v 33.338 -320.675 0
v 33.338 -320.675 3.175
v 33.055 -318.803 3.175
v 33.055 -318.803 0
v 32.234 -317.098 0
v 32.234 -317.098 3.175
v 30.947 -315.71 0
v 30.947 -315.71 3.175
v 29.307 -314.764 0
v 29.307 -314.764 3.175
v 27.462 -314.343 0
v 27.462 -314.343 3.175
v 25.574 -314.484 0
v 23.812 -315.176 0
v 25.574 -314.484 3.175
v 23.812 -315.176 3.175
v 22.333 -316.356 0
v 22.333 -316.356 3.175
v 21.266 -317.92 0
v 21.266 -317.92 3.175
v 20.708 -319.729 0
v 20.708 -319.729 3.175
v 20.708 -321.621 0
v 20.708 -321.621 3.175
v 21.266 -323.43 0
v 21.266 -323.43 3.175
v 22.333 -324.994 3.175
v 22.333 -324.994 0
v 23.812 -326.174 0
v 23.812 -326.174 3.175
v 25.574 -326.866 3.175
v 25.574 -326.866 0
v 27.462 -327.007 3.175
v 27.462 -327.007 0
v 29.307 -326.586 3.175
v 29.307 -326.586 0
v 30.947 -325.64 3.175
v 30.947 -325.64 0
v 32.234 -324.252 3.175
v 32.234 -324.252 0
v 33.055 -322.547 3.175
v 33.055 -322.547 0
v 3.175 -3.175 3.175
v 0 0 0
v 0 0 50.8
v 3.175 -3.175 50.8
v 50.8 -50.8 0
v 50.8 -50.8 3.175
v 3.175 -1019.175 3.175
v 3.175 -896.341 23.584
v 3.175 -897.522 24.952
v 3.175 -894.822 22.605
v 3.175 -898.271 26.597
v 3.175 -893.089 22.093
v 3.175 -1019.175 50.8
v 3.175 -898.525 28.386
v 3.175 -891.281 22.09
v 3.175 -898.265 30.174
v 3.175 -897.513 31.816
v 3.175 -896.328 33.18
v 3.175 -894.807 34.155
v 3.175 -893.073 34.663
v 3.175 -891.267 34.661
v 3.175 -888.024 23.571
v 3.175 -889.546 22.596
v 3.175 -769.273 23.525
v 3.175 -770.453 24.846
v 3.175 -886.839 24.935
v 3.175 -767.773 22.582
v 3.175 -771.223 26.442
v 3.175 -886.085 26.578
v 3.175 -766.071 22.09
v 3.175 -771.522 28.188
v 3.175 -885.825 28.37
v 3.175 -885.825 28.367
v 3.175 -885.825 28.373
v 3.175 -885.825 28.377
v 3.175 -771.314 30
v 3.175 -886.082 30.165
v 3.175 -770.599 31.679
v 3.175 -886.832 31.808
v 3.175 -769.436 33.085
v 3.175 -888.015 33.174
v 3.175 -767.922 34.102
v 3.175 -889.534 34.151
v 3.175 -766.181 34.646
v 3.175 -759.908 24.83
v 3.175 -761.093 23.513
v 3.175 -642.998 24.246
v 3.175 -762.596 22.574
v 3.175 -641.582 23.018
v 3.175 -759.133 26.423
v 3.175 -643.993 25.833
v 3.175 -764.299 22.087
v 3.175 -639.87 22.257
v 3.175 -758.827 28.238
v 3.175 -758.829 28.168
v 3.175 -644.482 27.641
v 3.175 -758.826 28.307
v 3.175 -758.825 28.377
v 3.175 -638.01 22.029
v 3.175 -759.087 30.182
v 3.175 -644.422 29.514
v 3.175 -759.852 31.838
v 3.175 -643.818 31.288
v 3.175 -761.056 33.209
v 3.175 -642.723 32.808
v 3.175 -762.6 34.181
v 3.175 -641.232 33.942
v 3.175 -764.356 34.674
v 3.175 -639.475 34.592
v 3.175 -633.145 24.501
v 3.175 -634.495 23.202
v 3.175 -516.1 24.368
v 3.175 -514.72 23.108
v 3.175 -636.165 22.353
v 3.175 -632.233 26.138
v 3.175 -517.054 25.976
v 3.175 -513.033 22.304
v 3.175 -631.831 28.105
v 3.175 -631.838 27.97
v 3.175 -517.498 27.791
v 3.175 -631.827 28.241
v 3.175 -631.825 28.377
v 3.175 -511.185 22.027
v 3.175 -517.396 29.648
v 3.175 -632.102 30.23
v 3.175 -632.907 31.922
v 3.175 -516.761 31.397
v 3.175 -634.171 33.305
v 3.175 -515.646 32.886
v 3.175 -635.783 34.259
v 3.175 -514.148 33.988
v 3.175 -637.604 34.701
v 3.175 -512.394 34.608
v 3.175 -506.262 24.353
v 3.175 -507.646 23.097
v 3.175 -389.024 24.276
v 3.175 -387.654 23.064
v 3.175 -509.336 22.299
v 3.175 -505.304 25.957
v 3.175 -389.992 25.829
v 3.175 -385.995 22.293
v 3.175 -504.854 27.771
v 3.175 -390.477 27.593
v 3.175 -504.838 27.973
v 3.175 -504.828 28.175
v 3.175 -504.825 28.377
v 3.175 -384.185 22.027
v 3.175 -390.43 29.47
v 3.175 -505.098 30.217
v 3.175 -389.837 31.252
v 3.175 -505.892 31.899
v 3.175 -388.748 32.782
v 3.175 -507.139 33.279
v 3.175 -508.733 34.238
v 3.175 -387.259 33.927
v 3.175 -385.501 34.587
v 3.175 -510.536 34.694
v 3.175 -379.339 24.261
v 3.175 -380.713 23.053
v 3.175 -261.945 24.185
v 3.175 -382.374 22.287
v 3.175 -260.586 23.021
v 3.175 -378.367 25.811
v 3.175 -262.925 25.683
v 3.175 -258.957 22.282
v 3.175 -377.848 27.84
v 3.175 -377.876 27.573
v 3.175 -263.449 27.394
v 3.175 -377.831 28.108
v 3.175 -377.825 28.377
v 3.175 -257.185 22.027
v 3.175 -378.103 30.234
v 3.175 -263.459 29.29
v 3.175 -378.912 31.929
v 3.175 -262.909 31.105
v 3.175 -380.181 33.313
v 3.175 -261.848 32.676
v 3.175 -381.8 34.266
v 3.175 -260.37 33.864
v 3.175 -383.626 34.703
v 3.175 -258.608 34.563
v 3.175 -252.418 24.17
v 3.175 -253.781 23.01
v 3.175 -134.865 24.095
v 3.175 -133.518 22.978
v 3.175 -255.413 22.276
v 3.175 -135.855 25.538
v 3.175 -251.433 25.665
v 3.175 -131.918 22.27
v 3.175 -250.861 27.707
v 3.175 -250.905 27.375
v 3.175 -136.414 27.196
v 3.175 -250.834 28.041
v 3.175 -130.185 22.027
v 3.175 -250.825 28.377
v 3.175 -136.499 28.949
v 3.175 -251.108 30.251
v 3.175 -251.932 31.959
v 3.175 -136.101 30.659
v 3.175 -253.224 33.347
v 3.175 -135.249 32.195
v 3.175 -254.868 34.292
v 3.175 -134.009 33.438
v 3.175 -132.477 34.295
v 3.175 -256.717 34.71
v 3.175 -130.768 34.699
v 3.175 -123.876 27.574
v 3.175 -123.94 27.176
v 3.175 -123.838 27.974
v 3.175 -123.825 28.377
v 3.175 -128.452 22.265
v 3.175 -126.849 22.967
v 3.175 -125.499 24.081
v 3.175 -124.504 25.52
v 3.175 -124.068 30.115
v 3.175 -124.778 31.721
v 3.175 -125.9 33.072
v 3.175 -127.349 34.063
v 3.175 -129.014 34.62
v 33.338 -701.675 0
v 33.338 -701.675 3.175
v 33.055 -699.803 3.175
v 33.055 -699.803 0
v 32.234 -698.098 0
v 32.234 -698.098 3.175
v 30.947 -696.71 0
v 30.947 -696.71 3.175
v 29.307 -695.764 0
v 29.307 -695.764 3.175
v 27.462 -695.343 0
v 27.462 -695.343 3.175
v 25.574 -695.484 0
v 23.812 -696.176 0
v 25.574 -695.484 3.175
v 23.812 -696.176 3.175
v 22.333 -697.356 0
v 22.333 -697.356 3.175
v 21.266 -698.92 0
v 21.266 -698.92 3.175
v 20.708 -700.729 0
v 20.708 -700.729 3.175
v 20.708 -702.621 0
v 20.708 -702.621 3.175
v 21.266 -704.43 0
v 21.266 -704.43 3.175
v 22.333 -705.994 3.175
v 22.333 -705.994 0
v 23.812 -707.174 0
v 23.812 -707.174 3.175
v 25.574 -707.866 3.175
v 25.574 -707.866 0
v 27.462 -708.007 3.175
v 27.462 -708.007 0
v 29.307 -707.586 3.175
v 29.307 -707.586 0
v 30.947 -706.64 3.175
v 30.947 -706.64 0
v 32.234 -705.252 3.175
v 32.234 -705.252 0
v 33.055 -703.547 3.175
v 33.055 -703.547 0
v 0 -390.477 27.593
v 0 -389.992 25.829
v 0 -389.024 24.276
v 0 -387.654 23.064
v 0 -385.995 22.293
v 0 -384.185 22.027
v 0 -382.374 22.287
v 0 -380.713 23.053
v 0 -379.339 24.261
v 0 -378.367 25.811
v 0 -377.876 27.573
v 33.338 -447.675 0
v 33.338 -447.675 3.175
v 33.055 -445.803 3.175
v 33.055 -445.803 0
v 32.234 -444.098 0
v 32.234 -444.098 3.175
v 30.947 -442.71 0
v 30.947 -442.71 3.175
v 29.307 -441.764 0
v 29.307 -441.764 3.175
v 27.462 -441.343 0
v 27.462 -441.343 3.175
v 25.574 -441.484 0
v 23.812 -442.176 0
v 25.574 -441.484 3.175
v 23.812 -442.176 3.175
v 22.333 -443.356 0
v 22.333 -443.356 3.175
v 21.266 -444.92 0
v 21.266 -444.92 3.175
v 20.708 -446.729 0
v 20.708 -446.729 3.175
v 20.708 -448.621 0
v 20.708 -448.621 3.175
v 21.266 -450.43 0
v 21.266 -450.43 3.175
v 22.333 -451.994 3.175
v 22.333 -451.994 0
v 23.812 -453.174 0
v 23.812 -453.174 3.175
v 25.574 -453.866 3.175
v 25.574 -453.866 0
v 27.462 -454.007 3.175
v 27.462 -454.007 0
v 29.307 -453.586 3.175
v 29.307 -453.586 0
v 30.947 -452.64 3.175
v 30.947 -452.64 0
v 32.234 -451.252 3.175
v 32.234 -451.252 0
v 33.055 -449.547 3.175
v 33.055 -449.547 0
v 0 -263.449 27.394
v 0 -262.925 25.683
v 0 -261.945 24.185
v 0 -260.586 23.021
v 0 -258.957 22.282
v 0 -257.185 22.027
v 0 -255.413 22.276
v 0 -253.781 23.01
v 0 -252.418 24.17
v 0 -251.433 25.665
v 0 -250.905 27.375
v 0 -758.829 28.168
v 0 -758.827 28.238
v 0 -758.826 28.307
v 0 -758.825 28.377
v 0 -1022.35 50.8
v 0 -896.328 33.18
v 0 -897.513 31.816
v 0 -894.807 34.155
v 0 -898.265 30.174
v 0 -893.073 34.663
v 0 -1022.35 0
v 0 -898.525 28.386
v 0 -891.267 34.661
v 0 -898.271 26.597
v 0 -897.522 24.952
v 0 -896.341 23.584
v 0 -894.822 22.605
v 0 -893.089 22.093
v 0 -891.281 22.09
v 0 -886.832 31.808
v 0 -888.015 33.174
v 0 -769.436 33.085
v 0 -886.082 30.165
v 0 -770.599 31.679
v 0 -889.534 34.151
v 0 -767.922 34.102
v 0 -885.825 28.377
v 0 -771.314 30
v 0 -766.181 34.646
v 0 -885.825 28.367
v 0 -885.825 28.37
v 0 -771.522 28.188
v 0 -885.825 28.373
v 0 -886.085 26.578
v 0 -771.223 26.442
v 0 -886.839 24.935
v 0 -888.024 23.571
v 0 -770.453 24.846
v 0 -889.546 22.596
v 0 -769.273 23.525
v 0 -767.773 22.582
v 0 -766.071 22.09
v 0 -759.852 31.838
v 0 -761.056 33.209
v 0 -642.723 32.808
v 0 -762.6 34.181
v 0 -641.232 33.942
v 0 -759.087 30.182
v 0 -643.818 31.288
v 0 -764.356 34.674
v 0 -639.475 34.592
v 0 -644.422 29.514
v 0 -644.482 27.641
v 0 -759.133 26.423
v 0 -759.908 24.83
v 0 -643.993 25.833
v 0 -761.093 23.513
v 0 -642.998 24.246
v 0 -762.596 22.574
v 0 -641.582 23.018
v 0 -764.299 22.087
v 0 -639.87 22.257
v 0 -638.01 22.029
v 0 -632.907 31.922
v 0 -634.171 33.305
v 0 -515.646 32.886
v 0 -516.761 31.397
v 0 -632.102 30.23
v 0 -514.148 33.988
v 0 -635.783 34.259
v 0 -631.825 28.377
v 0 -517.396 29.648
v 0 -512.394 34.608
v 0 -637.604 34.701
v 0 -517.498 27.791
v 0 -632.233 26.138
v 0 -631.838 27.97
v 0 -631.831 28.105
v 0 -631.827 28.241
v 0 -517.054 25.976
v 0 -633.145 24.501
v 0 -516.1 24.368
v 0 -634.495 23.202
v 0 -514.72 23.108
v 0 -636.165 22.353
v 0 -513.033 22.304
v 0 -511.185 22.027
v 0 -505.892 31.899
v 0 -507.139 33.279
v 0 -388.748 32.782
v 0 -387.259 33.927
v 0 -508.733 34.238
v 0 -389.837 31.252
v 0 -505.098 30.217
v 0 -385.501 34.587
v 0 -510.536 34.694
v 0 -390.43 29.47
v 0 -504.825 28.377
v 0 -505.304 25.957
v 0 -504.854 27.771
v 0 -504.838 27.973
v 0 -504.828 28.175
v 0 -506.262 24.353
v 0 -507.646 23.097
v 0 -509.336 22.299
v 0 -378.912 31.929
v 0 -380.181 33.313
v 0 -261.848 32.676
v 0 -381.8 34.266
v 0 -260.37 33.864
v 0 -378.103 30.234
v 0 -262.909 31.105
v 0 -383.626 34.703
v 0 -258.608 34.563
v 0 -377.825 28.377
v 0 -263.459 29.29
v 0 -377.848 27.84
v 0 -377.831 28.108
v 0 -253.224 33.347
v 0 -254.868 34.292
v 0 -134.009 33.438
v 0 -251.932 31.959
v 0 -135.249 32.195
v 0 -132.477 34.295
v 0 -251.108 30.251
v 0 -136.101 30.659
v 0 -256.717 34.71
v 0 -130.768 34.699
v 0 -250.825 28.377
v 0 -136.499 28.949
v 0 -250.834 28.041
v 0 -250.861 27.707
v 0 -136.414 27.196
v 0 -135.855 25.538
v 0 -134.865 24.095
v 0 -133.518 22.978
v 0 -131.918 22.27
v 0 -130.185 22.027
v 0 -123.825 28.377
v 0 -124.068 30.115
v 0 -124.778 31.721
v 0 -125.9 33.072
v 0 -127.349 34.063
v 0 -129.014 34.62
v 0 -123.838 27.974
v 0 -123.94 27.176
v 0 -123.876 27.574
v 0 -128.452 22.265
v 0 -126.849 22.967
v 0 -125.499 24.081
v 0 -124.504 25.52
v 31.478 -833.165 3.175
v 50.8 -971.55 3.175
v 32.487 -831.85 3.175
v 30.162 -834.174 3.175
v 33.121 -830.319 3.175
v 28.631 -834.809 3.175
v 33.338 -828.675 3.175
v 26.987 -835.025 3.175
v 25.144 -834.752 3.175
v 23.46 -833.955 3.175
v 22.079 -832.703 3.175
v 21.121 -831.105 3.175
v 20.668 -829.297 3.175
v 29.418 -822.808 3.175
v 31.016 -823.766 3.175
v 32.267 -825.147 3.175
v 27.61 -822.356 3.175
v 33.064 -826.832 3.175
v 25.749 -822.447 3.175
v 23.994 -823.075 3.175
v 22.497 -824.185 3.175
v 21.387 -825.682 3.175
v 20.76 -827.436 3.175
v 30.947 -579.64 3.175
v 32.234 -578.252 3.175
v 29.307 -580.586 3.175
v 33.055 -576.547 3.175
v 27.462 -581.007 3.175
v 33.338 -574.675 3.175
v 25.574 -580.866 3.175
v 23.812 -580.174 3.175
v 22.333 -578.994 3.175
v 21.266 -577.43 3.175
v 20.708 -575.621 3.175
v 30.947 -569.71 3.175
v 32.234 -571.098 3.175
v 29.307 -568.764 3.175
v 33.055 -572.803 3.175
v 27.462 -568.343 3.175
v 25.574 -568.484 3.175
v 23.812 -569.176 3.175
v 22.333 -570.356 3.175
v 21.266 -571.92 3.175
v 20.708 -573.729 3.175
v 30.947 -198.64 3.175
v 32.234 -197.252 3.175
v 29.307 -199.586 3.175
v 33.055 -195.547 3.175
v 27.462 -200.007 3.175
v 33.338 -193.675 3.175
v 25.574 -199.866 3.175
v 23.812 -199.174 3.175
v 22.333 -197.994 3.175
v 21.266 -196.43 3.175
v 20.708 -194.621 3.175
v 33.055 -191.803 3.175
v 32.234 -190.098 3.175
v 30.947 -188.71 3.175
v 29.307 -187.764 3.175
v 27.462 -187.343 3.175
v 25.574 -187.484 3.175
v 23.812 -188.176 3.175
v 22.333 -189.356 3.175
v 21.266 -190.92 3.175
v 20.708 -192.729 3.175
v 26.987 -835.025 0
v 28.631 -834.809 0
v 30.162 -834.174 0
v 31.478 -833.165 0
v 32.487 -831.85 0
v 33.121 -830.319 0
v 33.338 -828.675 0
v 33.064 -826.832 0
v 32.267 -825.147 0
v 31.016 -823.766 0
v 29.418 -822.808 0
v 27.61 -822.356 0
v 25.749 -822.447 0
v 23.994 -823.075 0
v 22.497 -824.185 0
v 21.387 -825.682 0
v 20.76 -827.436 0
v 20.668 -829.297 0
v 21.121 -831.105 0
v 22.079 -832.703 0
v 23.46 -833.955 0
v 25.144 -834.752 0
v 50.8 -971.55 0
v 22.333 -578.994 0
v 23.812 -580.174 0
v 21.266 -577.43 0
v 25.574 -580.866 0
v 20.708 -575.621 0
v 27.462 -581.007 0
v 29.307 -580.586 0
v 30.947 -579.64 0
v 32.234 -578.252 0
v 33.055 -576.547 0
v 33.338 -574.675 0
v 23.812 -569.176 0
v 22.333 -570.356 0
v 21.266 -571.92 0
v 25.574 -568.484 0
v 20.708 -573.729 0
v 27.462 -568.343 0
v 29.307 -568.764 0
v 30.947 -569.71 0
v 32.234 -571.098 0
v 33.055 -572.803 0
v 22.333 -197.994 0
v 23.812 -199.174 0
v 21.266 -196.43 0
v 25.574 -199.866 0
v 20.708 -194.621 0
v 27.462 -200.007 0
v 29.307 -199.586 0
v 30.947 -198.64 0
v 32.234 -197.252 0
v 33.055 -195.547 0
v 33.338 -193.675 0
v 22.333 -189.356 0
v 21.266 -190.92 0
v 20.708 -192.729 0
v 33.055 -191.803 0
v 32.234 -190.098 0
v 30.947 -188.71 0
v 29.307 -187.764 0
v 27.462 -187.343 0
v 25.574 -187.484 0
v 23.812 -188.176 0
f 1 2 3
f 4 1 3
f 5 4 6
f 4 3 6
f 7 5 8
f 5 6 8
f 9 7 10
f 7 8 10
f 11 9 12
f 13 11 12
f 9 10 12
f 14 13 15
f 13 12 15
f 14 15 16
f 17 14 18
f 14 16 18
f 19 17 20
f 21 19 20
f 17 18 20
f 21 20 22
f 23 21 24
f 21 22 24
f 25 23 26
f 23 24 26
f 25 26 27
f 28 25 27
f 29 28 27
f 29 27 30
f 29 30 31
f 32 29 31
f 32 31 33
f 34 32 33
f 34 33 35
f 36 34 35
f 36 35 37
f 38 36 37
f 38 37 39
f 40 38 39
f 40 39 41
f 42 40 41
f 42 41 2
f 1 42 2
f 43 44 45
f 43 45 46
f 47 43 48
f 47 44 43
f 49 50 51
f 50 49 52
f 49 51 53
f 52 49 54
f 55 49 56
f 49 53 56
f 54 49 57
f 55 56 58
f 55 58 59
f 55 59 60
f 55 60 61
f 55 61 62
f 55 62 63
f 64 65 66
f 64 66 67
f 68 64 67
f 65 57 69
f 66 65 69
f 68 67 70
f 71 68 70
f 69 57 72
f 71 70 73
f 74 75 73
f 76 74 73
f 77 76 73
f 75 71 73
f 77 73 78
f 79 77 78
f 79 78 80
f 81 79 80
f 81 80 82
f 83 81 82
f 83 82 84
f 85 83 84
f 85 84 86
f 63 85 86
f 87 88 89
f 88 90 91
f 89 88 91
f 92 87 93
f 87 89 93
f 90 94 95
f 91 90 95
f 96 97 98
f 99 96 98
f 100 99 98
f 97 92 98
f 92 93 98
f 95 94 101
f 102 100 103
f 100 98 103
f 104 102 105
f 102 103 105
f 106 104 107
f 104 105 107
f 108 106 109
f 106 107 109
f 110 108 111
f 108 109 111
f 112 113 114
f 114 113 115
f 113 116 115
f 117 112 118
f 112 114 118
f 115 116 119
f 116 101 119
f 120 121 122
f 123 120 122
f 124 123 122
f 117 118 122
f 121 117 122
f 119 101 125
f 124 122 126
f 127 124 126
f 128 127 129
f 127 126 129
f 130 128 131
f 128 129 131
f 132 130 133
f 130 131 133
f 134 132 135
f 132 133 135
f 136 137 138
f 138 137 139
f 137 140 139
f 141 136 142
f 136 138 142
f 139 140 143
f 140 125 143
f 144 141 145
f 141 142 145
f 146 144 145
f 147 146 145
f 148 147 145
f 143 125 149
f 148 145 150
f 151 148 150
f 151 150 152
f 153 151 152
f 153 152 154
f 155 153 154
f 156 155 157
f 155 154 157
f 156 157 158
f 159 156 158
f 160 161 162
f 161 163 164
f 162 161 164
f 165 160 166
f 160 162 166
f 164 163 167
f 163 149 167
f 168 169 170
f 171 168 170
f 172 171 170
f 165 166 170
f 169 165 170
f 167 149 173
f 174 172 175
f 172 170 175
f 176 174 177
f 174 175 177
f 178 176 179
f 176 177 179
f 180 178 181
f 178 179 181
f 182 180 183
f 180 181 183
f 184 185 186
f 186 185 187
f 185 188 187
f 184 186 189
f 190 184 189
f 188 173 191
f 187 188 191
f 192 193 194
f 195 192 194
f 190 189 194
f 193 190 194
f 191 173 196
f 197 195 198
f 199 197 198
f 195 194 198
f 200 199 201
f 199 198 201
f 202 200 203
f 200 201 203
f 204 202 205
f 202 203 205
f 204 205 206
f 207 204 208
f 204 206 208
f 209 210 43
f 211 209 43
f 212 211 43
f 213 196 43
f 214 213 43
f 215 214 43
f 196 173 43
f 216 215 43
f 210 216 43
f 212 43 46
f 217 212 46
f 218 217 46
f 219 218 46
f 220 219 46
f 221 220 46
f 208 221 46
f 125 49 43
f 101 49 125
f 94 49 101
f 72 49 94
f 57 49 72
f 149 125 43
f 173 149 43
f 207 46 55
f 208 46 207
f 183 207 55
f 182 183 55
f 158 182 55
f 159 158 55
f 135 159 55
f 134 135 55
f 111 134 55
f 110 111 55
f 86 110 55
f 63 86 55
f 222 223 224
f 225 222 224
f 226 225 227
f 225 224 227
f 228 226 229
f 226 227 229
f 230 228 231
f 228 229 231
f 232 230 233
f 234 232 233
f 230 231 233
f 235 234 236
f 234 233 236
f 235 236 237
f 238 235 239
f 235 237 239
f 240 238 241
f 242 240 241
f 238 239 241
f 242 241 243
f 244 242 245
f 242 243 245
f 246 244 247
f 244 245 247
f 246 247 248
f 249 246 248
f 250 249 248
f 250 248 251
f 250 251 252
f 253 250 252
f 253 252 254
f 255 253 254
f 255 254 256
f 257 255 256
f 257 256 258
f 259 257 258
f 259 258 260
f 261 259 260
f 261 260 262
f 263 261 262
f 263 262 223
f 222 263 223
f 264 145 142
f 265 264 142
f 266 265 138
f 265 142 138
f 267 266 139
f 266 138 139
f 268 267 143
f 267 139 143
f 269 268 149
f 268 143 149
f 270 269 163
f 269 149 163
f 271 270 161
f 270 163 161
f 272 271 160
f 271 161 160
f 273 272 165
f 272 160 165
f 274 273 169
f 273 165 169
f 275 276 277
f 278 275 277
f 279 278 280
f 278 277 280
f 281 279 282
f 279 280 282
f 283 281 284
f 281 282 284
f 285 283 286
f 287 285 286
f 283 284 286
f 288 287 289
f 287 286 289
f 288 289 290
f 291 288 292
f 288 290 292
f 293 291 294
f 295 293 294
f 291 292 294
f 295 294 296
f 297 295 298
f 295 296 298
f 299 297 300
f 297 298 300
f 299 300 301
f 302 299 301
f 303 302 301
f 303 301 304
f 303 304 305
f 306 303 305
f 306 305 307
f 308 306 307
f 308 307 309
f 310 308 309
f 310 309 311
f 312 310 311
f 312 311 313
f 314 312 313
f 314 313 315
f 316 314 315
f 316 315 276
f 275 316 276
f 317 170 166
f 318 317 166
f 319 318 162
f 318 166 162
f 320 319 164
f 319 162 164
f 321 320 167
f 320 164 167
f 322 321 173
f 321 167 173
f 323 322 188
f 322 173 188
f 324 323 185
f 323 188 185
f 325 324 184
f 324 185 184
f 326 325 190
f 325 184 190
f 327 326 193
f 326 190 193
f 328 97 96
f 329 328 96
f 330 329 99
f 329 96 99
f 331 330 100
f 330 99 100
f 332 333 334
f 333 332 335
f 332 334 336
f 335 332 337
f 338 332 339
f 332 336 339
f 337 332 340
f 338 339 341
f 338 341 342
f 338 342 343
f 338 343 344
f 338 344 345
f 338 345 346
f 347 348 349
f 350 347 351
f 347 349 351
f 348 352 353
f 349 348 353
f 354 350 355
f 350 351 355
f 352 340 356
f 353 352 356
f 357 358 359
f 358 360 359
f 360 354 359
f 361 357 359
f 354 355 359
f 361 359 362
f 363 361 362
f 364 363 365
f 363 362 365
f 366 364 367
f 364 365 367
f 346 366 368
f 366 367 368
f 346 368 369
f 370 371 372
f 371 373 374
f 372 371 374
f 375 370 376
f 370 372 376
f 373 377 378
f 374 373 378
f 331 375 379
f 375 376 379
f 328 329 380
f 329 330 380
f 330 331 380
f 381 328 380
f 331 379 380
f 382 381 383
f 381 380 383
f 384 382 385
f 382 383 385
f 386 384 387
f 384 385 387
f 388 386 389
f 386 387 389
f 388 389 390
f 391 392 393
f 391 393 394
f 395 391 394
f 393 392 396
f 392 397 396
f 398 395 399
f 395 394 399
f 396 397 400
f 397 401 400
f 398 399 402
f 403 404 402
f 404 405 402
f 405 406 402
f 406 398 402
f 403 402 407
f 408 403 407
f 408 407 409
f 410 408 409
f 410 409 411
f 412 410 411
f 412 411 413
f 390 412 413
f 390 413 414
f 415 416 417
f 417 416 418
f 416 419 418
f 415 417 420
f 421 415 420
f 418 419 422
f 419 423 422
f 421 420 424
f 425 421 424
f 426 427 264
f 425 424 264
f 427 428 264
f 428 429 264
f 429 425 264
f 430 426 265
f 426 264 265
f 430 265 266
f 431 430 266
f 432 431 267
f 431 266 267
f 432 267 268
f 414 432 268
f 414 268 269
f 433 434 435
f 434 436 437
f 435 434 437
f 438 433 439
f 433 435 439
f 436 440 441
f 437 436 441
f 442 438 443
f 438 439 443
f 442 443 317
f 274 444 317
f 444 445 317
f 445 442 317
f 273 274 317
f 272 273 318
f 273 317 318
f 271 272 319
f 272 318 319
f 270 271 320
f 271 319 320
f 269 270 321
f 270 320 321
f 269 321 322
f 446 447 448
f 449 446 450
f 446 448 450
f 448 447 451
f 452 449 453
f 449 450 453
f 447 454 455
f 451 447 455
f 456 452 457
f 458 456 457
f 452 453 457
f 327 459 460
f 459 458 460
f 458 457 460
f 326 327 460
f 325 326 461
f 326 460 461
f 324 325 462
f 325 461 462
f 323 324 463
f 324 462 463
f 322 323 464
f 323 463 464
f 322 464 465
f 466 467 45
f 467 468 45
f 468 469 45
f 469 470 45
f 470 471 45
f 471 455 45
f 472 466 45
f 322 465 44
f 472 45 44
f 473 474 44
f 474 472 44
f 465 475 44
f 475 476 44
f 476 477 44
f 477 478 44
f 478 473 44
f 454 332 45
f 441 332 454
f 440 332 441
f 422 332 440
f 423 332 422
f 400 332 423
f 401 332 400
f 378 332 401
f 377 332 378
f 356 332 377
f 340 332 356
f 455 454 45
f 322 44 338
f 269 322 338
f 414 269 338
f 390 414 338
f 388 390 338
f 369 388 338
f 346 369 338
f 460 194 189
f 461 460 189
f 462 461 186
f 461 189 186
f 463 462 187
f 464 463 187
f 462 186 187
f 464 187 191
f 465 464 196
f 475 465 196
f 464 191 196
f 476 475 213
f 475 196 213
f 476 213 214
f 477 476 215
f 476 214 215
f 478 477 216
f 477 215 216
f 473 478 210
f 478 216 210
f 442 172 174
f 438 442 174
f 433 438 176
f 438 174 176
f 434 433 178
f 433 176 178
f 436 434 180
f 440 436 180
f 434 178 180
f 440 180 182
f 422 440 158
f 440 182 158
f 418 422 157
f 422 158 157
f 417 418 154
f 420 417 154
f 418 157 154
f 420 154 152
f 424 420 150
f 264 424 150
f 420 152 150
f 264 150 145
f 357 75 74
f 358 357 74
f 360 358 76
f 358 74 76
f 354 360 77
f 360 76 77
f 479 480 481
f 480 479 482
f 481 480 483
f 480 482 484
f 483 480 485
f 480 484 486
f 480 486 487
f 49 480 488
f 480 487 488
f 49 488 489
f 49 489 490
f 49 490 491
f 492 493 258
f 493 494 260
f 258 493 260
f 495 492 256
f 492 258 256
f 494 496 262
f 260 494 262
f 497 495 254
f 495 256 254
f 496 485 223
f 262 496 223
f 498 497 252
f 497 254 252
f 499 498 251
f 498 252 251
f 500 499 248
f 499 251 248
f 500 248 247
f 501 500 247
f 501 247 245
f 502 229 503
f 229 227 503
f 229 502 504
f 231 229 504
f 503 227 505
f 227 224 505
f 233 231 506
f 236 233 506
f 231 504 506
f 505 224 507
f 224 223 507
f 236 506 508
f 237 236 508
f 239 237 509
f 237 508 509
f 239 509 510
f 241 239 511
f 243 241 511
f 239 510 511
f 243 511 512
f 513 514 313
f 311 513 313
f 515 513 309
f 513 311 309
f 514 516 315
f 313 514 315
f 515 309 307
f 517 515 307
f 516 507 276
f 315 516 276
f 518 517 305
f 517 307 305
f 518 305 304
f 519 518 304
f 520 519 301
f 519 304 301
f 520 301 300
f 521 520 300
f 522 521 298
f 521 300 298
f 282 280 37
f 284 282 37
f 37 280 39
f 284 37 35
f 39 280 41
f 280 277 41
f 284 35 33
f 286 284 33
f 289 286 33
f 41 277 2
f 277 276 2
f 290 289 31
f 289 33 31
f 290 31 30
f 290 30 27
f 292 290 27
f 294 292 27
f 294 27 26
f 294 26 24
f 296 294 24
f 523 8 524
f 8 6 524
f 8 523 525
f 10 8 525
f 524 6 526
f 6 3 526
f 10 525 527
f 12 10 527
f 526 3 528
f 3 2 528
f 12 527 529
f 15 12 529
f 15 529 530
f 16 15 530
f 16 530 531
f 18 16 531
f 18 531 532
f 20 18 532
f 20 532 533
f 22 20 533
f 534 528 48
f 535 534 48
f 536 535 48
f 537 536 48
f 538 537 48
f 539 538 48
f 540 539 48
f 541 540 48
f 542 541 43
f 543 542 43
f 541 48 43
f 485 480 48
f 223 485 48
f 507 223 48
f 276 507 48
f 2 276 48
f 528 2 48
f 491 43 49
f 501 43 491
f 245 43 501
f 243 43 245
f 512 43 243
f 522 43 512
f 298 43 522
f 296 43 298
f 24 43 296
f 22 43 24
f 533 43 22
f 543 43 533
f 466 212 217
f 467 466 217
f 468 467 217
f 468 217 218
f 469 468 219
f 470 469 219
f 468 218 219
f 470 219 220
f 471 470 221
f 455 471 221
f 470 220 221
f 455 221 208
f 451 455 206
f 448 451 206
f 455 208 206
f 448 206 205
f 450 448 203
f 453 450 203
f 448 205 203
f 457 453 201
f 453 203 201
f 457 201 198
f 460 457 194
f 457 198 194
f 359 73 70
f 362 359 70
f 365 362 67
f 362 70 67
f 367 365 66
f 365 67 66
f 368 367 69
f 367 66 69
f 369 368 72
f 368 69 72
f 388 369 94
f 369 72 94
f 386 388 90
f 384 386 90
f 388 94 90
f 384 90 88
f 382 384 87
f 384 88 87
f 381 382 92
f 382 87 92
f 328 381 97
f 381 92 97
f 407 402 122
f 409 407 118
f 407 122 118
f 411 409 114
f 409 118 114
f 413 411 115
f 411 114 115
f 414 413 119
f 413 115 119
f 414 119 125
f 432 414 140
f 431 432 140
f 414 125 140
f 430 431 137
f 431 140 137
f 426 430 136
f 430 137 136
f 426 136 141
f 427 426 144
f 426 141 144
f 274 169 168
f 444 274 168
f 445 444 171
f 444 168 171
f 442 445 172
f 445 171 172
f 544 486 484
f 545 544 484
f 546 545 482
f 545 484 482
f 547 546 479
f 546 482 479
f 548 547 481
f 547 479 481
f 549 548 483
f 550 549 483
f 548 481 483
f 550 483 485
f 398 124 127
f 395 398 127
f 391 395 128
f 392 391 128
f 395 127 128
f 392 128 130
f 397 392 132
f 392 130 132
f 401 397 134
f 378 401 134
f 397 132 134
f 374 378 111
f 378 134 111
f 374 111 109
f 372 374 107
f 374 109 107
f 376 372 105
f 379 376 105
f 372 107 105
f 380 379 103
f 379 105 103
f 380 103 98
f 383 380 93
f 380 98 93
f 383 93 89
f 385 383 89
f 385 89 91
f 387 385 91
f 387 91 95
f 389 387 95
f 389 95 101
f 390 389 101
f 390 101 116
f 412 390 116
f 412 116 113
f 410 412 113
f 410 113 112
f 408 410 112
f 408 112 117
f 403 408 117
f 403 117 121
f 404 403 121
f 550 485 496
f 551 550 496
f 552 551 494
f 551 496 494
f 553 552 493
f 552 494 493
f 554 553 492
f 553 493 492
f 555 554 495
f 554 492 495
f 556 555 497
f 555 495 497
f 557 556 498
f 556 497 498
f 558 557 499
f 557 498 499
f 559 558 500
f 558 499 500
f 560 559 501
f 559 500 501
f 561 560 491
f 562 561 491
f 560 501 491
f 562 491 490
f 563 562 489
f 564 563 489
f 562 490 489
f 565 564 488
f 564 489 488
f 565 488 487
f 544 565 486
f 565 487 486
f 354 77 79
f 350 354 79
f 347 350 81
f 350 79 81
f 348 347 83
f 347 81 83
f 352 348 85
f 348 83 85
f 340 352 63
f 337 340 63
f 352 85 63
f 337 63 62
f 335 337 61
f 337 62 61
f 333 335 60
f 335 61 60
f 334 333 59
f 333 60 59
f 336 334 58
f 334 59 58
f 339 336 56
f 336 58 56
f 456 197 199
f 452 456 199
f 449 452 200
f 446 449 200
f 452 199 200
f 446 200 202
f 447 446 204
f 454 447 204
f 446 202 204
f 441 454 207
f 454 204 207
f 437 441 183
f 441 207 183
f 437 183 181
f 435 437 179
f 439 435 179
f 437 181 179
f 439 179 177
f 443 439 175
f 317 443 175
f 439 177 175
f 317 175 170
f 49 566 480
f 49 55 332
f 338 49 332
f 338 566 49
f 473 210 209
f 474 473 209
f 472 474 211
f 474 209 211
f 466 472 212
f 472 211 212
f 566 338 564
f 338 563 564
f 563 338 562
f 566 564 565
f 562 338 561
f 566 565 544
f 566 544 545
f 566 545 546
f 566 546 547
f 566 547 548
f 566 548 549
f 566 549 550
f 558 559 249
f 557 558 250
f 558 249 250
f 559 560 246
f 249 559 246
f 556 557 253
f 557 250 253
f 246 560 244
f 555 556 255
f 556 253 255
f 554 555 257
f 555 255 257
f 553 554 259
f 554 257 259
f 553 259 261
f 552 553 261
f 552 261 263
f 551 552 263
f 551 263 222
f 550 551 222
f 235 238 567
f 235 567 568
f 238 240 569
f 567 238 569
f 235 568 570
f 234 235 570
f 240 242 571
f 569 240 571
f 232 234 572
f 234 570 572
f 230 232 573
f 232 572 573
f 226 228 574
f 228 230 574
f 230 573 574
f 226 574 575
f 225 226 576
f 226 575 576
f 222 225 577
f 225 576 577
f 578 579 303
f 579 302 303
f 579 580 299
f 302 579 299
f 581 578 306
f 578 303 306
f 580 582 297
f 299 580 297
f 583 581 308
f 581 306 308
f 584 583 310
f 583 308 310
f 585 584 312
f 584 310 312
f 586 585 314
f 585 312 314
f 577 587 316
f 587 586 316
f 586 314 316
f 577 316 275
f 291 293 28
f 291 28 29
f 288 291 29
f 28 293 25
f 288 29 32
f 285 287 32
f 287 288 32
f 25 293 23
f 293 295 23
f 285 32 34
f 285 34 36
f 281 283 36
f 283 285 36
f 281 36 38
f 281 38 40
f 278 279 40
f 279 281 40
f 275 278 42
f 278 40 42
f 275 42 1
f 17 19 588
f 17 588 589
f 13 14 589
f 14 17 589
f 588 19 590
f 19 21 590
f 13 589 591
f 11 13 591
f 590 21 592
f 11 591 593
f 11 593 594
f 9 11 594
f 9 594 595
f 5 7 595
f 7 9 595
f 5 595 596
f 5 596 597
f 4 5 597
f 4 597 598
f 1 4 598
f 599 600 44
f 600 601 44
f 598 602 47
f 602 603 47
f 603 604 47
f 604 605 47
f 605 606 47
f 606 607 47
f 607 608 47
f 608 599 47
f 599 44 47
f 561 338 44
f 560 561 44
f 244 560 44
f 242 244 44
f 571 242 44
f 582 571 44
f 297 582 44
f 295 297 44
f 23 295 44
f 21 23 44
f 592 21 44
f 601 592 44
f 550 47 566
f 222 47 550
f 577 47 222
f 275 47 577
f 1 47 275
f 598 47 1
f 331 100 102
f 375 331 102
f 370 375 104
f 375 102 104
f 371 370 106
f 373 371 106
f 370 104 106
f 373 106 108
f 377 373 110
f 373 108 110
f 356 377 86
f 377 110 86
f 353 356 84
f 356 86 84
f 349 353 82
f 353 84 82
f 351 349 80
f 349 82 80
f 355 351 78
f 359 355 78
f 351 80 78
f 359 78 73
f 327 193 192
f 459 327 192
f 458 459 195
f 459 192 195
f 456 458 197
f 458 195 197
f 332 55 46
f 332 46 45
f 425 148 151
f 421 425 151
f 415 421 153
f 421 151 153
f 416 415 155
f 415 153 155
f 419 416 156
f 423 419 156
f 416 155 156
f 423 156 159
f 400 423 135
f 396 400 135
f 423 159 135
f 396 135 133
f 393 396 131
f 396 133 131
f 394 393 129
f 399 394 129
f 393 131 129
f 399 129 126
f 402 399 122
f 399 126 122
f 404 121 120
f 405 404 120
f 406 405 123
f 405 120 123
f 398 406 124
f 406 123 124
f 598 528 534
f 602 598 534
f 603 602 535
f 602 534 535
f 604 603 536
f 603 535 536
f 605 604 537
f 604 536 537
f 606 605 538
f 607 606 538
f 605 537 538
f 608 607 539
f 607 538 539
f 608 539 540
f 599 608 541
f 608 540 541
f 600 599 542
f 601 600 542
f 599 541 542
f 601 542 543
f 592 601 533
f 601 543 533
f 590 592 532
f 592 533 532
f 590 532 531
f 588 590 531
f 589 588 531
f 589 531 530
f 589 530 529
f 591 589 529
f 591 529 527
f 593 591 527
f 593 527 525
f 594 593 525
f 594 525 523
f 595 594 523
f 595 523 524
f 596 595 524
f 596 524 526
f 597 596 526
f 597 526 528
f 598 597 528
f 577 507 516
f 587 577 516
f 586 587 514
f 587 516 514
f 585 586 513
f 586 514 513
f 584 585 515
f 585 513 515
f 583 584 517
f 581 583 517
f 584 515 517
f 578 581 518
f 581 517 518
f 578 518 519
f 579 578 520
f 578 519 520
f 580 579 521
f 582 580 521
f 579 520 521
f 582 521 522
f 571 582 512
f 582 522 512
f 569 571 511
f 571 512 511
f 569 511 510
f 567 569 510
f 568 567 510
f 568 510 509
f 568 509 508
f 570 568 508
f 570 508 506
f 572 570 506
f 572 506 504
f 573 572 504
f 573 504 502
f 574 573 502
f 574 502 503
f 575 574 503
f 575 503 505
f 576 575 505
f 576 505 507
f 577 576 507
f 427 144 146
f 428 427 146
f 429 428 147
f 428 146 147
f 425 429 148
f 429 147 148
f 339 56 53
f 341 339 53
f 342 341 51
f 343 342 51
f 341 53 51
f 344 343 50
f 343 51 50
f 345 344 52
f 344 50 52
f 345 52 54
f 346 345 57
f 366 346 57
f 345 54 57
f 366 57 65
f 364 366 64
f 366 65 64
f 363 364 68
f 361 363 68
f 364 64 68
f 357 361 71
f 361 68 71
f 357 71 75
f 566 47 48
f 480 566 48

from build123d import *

# Parameters (mm, degrees)
F1_DEPTH = 1270
F3_DEPTH = 127
F5_DEPTH = 25.4
F6_R     = 6.35
F7_DEPTH = 25.4


# Not quite as in the source:
# - a feature names something its author has since deleted; it is built from what else it names


with BuildPart() as f1:
    # F0 (on Front) → F1 (new body)
    with BuildSketch(Plane.XZ):
        Polygon((3.175, 50.8), (0, 50.8), (0, 0), (50.8, 0), (50.8, 3.175), (3.175, 3.175), align=None)
    extrude(amount=F1_DEPTH)

    # F2 (on face) → F3 (intersect)
    with BuildSketch(Plane(origin=(0, 0, 0), x_dir=(1, 0, 0), z_dir=(0, 0, -1))):
        Polygon((0, 1022.35), (0, 0), (50.8, 50.8), (50.8, 971.55), align=None)
    extrude(amount=-F3_DEPTH, mode=Mode.INTERSECT)

    # F4 (on face) → F5 (cut)
    with BuildSketch(Plane.YZ.offset(3.175)):
        with BuildLine():
            ThreePointArc((-885.825155029, 28.3765627422), (-892.1701940961, 34.7265608044), (-898.5251472776, 28.3864846051))
            Line((-898.5251472776, 28.3864846051), (-885.8251627805, 28.3666408793))
            ThreePointArc((-885.8251627805, 28.3666408793), (-885.8251569669, 28.3716018093), (-885.825155029, 28.3765627422))
        make_face()
        with BuildLine():
            ThreePointArc((-123.825155029, 28.3765627422), (-130.7681849335, 34.6988104068), (-136.4143882675, 27.1956865442))
            Line((-136.4143882675, 27.1956865442), (-123.9396424845, 27.1761947539))
            ThreePointArc((-123.9396424845, 27.1761947539), (-123.8538416901, 27.7736550617), (-123.825155029, 28.3765627422))
        make_face()
        with BuildLine():
            Line((-123.9396424845, 27.1761947539), (-136.4143882675, 27.1956865442))
            ThreePointArc((-136.4143882675, 27.1956865442), (-130.1850768919, 22.0265704937), (-123.9396424845, 27.1761947539))
        make_face()
        with BuildLine():
            ThreePointArc((-250.825155029, 28.3765627422), (-257.6678327049, 34.7074211917), (-263.4487042283, 27.3941776629))
            Line((-263.4487042283, 27.3941776629), (-250.9047064081, 27.3745776663))
            ThreePointArc((-250.9047064081, 27.3745776663), (-250.8450741155, 27.8739937135), (-250.825155029, 28.3765627422))
        make_face()
        with BuildLine():
            Line((-250.9047064081, 27.3745776663), (-263.4487042283, 27.3941776629))
            ThreePointArc((-263.4487042283, 27.3941776629), (-257.1850768919, 22.0265704937), (-250.9047064081, 27.3745776663))
        make_face()
        with BuildLine():
            ThreePointArc((-377.825155029, 28.3765627422), (-384.567858719, 34.7144081026), (-390.4765830013, 27.5926587234))
            Line((-390.4765830013, 27.5926587234), (-377.8762075195, 27.5729706367))
            ThreePointArc((-377.8762075195, 27.5729706367), (-377.837931004, 27.9739566603), (-377.825155029, 28.3765627422))
        make_face()
        with BuildLine():
            Line((-377.8762075195, 27.5729706367), (-390.4765830013, 27.5926587234))
            ThreePointArc((-390.4765830013, 27.5926587234), (-384.1850768919, 22.0265704937), (-377.8762075195, 27.5729706367))
        make_face()
        with BuildLine():
            ThreePointArc((-504.825155029, 28.3765627422), (-511.4681836347, 34.7197980552), (-517.498110694, 27.7911298605))
            Line((-517.498110694, 27.7911298605), (-504.8540597111, 27.7713735308))
            ThreePointArc((-504.8540597111, 27.7713735308), (-504.8323853158, 28.0736232011), (-504.825155029, 28.3765627422))
        make_face()
        with BuildLine():
            Line((-504.8540597111, 27.7713735308), (-517.498110694, 27.7911298605))
            ThreePointArc((-517.498110694, 27.7911298605), (-511.1850768919, 22.0265704937), (-504.8540597111, 27.7713735308))
        make_face()
        with BuildLine():
            ThreePointArc((-631.825155029, 28.3765627422), (-638.3687307774, 34.7236115391), (-644.5133529596, 27.9895911765))
            Line((-644.5133529596, 27.9895911765), (-631.8381973298, 27.9697862458))
            ThreePointArc((-631.8381973298, 27.9697862458), (-631.8284164417, 28.1730699785), (-631.825155029, 28.3765627422))
        make_face()
        with BuildLine():
            Line((-631.8381973298, 27.9697862458), (-644.5133529596, 27.9895911765))
            ThreePointArc((-644.5133529596, 27.9895911765), (-638.1850768919, 22.0265704937), (-631.8381973298, 27.9697862458))
        make_face()
        with BuildLine():
            ThreePointArc((-758.825155029, 28.3765627422), (-765.2694254172, 34.7258629473), (-771.5223560035, 28.1880427438))
            Line((-771.5223560035, 28.1880427438), (-758.8285741702, 28.1682087096))
            ThreePointArc((-758.8285741702, 28.1682087096), (-758.8260098719, 28.2723716996), (-758.825155029, 28.3765627422))
        make_face()
        with BuildLine():
            Line((-758.8285741702, 28.1682087096), (-771.5223560035, 28.1880427438))
            ThreePointArc((-771.5223560035, 28.1880427438), (-765.1850768919, 22.0265704937), (-758.8285741702, 28.1682087096))
        make_face()
        with BuildLine():
            Line((-885.8251627805, 28.3666408793), (-898.5251472776, 28.3864846051))
            ThreePointArc((-898.5251472776, 28.3864846051), (-892.1850768919, 22.0265704937), (-885.8251627805, 28.3666408793))
        make_face()
    extrude(amount=-F5_DEPTH, mode=Mode.SUBTRACT)

    # F6 (on face) → F7 (cut)
    with BuildSketch(Plane.XY.offset(3.175)):
        with BuildLine():
            ThreePointArc((33.3375, -828.675), (22.4973719395, -824.1848719395), (26.9875, -835.025))
            ThreePointArc((26.9875, -835.025), (31.4776280605, -833.1651280605), (33.3375, -828.675))
        make_face()
        with Locations((26.9875, -701.675)):
            Circle(F6_R)
        with Locations((26.9875, -574.675)):
            Circle(F6_R)
        with Locations((26.9875, -447.675)):
            Circle(F6_R)
        with Locations((26.9875, -193.675)):
            Circle(F6_R)
        with Locations((26.9875, -320.675)):
            Circle(F6_R)
    extrude(amount=-F7_DEPTH, mode=Mode.SUBTRACT)


solid = f1.part
